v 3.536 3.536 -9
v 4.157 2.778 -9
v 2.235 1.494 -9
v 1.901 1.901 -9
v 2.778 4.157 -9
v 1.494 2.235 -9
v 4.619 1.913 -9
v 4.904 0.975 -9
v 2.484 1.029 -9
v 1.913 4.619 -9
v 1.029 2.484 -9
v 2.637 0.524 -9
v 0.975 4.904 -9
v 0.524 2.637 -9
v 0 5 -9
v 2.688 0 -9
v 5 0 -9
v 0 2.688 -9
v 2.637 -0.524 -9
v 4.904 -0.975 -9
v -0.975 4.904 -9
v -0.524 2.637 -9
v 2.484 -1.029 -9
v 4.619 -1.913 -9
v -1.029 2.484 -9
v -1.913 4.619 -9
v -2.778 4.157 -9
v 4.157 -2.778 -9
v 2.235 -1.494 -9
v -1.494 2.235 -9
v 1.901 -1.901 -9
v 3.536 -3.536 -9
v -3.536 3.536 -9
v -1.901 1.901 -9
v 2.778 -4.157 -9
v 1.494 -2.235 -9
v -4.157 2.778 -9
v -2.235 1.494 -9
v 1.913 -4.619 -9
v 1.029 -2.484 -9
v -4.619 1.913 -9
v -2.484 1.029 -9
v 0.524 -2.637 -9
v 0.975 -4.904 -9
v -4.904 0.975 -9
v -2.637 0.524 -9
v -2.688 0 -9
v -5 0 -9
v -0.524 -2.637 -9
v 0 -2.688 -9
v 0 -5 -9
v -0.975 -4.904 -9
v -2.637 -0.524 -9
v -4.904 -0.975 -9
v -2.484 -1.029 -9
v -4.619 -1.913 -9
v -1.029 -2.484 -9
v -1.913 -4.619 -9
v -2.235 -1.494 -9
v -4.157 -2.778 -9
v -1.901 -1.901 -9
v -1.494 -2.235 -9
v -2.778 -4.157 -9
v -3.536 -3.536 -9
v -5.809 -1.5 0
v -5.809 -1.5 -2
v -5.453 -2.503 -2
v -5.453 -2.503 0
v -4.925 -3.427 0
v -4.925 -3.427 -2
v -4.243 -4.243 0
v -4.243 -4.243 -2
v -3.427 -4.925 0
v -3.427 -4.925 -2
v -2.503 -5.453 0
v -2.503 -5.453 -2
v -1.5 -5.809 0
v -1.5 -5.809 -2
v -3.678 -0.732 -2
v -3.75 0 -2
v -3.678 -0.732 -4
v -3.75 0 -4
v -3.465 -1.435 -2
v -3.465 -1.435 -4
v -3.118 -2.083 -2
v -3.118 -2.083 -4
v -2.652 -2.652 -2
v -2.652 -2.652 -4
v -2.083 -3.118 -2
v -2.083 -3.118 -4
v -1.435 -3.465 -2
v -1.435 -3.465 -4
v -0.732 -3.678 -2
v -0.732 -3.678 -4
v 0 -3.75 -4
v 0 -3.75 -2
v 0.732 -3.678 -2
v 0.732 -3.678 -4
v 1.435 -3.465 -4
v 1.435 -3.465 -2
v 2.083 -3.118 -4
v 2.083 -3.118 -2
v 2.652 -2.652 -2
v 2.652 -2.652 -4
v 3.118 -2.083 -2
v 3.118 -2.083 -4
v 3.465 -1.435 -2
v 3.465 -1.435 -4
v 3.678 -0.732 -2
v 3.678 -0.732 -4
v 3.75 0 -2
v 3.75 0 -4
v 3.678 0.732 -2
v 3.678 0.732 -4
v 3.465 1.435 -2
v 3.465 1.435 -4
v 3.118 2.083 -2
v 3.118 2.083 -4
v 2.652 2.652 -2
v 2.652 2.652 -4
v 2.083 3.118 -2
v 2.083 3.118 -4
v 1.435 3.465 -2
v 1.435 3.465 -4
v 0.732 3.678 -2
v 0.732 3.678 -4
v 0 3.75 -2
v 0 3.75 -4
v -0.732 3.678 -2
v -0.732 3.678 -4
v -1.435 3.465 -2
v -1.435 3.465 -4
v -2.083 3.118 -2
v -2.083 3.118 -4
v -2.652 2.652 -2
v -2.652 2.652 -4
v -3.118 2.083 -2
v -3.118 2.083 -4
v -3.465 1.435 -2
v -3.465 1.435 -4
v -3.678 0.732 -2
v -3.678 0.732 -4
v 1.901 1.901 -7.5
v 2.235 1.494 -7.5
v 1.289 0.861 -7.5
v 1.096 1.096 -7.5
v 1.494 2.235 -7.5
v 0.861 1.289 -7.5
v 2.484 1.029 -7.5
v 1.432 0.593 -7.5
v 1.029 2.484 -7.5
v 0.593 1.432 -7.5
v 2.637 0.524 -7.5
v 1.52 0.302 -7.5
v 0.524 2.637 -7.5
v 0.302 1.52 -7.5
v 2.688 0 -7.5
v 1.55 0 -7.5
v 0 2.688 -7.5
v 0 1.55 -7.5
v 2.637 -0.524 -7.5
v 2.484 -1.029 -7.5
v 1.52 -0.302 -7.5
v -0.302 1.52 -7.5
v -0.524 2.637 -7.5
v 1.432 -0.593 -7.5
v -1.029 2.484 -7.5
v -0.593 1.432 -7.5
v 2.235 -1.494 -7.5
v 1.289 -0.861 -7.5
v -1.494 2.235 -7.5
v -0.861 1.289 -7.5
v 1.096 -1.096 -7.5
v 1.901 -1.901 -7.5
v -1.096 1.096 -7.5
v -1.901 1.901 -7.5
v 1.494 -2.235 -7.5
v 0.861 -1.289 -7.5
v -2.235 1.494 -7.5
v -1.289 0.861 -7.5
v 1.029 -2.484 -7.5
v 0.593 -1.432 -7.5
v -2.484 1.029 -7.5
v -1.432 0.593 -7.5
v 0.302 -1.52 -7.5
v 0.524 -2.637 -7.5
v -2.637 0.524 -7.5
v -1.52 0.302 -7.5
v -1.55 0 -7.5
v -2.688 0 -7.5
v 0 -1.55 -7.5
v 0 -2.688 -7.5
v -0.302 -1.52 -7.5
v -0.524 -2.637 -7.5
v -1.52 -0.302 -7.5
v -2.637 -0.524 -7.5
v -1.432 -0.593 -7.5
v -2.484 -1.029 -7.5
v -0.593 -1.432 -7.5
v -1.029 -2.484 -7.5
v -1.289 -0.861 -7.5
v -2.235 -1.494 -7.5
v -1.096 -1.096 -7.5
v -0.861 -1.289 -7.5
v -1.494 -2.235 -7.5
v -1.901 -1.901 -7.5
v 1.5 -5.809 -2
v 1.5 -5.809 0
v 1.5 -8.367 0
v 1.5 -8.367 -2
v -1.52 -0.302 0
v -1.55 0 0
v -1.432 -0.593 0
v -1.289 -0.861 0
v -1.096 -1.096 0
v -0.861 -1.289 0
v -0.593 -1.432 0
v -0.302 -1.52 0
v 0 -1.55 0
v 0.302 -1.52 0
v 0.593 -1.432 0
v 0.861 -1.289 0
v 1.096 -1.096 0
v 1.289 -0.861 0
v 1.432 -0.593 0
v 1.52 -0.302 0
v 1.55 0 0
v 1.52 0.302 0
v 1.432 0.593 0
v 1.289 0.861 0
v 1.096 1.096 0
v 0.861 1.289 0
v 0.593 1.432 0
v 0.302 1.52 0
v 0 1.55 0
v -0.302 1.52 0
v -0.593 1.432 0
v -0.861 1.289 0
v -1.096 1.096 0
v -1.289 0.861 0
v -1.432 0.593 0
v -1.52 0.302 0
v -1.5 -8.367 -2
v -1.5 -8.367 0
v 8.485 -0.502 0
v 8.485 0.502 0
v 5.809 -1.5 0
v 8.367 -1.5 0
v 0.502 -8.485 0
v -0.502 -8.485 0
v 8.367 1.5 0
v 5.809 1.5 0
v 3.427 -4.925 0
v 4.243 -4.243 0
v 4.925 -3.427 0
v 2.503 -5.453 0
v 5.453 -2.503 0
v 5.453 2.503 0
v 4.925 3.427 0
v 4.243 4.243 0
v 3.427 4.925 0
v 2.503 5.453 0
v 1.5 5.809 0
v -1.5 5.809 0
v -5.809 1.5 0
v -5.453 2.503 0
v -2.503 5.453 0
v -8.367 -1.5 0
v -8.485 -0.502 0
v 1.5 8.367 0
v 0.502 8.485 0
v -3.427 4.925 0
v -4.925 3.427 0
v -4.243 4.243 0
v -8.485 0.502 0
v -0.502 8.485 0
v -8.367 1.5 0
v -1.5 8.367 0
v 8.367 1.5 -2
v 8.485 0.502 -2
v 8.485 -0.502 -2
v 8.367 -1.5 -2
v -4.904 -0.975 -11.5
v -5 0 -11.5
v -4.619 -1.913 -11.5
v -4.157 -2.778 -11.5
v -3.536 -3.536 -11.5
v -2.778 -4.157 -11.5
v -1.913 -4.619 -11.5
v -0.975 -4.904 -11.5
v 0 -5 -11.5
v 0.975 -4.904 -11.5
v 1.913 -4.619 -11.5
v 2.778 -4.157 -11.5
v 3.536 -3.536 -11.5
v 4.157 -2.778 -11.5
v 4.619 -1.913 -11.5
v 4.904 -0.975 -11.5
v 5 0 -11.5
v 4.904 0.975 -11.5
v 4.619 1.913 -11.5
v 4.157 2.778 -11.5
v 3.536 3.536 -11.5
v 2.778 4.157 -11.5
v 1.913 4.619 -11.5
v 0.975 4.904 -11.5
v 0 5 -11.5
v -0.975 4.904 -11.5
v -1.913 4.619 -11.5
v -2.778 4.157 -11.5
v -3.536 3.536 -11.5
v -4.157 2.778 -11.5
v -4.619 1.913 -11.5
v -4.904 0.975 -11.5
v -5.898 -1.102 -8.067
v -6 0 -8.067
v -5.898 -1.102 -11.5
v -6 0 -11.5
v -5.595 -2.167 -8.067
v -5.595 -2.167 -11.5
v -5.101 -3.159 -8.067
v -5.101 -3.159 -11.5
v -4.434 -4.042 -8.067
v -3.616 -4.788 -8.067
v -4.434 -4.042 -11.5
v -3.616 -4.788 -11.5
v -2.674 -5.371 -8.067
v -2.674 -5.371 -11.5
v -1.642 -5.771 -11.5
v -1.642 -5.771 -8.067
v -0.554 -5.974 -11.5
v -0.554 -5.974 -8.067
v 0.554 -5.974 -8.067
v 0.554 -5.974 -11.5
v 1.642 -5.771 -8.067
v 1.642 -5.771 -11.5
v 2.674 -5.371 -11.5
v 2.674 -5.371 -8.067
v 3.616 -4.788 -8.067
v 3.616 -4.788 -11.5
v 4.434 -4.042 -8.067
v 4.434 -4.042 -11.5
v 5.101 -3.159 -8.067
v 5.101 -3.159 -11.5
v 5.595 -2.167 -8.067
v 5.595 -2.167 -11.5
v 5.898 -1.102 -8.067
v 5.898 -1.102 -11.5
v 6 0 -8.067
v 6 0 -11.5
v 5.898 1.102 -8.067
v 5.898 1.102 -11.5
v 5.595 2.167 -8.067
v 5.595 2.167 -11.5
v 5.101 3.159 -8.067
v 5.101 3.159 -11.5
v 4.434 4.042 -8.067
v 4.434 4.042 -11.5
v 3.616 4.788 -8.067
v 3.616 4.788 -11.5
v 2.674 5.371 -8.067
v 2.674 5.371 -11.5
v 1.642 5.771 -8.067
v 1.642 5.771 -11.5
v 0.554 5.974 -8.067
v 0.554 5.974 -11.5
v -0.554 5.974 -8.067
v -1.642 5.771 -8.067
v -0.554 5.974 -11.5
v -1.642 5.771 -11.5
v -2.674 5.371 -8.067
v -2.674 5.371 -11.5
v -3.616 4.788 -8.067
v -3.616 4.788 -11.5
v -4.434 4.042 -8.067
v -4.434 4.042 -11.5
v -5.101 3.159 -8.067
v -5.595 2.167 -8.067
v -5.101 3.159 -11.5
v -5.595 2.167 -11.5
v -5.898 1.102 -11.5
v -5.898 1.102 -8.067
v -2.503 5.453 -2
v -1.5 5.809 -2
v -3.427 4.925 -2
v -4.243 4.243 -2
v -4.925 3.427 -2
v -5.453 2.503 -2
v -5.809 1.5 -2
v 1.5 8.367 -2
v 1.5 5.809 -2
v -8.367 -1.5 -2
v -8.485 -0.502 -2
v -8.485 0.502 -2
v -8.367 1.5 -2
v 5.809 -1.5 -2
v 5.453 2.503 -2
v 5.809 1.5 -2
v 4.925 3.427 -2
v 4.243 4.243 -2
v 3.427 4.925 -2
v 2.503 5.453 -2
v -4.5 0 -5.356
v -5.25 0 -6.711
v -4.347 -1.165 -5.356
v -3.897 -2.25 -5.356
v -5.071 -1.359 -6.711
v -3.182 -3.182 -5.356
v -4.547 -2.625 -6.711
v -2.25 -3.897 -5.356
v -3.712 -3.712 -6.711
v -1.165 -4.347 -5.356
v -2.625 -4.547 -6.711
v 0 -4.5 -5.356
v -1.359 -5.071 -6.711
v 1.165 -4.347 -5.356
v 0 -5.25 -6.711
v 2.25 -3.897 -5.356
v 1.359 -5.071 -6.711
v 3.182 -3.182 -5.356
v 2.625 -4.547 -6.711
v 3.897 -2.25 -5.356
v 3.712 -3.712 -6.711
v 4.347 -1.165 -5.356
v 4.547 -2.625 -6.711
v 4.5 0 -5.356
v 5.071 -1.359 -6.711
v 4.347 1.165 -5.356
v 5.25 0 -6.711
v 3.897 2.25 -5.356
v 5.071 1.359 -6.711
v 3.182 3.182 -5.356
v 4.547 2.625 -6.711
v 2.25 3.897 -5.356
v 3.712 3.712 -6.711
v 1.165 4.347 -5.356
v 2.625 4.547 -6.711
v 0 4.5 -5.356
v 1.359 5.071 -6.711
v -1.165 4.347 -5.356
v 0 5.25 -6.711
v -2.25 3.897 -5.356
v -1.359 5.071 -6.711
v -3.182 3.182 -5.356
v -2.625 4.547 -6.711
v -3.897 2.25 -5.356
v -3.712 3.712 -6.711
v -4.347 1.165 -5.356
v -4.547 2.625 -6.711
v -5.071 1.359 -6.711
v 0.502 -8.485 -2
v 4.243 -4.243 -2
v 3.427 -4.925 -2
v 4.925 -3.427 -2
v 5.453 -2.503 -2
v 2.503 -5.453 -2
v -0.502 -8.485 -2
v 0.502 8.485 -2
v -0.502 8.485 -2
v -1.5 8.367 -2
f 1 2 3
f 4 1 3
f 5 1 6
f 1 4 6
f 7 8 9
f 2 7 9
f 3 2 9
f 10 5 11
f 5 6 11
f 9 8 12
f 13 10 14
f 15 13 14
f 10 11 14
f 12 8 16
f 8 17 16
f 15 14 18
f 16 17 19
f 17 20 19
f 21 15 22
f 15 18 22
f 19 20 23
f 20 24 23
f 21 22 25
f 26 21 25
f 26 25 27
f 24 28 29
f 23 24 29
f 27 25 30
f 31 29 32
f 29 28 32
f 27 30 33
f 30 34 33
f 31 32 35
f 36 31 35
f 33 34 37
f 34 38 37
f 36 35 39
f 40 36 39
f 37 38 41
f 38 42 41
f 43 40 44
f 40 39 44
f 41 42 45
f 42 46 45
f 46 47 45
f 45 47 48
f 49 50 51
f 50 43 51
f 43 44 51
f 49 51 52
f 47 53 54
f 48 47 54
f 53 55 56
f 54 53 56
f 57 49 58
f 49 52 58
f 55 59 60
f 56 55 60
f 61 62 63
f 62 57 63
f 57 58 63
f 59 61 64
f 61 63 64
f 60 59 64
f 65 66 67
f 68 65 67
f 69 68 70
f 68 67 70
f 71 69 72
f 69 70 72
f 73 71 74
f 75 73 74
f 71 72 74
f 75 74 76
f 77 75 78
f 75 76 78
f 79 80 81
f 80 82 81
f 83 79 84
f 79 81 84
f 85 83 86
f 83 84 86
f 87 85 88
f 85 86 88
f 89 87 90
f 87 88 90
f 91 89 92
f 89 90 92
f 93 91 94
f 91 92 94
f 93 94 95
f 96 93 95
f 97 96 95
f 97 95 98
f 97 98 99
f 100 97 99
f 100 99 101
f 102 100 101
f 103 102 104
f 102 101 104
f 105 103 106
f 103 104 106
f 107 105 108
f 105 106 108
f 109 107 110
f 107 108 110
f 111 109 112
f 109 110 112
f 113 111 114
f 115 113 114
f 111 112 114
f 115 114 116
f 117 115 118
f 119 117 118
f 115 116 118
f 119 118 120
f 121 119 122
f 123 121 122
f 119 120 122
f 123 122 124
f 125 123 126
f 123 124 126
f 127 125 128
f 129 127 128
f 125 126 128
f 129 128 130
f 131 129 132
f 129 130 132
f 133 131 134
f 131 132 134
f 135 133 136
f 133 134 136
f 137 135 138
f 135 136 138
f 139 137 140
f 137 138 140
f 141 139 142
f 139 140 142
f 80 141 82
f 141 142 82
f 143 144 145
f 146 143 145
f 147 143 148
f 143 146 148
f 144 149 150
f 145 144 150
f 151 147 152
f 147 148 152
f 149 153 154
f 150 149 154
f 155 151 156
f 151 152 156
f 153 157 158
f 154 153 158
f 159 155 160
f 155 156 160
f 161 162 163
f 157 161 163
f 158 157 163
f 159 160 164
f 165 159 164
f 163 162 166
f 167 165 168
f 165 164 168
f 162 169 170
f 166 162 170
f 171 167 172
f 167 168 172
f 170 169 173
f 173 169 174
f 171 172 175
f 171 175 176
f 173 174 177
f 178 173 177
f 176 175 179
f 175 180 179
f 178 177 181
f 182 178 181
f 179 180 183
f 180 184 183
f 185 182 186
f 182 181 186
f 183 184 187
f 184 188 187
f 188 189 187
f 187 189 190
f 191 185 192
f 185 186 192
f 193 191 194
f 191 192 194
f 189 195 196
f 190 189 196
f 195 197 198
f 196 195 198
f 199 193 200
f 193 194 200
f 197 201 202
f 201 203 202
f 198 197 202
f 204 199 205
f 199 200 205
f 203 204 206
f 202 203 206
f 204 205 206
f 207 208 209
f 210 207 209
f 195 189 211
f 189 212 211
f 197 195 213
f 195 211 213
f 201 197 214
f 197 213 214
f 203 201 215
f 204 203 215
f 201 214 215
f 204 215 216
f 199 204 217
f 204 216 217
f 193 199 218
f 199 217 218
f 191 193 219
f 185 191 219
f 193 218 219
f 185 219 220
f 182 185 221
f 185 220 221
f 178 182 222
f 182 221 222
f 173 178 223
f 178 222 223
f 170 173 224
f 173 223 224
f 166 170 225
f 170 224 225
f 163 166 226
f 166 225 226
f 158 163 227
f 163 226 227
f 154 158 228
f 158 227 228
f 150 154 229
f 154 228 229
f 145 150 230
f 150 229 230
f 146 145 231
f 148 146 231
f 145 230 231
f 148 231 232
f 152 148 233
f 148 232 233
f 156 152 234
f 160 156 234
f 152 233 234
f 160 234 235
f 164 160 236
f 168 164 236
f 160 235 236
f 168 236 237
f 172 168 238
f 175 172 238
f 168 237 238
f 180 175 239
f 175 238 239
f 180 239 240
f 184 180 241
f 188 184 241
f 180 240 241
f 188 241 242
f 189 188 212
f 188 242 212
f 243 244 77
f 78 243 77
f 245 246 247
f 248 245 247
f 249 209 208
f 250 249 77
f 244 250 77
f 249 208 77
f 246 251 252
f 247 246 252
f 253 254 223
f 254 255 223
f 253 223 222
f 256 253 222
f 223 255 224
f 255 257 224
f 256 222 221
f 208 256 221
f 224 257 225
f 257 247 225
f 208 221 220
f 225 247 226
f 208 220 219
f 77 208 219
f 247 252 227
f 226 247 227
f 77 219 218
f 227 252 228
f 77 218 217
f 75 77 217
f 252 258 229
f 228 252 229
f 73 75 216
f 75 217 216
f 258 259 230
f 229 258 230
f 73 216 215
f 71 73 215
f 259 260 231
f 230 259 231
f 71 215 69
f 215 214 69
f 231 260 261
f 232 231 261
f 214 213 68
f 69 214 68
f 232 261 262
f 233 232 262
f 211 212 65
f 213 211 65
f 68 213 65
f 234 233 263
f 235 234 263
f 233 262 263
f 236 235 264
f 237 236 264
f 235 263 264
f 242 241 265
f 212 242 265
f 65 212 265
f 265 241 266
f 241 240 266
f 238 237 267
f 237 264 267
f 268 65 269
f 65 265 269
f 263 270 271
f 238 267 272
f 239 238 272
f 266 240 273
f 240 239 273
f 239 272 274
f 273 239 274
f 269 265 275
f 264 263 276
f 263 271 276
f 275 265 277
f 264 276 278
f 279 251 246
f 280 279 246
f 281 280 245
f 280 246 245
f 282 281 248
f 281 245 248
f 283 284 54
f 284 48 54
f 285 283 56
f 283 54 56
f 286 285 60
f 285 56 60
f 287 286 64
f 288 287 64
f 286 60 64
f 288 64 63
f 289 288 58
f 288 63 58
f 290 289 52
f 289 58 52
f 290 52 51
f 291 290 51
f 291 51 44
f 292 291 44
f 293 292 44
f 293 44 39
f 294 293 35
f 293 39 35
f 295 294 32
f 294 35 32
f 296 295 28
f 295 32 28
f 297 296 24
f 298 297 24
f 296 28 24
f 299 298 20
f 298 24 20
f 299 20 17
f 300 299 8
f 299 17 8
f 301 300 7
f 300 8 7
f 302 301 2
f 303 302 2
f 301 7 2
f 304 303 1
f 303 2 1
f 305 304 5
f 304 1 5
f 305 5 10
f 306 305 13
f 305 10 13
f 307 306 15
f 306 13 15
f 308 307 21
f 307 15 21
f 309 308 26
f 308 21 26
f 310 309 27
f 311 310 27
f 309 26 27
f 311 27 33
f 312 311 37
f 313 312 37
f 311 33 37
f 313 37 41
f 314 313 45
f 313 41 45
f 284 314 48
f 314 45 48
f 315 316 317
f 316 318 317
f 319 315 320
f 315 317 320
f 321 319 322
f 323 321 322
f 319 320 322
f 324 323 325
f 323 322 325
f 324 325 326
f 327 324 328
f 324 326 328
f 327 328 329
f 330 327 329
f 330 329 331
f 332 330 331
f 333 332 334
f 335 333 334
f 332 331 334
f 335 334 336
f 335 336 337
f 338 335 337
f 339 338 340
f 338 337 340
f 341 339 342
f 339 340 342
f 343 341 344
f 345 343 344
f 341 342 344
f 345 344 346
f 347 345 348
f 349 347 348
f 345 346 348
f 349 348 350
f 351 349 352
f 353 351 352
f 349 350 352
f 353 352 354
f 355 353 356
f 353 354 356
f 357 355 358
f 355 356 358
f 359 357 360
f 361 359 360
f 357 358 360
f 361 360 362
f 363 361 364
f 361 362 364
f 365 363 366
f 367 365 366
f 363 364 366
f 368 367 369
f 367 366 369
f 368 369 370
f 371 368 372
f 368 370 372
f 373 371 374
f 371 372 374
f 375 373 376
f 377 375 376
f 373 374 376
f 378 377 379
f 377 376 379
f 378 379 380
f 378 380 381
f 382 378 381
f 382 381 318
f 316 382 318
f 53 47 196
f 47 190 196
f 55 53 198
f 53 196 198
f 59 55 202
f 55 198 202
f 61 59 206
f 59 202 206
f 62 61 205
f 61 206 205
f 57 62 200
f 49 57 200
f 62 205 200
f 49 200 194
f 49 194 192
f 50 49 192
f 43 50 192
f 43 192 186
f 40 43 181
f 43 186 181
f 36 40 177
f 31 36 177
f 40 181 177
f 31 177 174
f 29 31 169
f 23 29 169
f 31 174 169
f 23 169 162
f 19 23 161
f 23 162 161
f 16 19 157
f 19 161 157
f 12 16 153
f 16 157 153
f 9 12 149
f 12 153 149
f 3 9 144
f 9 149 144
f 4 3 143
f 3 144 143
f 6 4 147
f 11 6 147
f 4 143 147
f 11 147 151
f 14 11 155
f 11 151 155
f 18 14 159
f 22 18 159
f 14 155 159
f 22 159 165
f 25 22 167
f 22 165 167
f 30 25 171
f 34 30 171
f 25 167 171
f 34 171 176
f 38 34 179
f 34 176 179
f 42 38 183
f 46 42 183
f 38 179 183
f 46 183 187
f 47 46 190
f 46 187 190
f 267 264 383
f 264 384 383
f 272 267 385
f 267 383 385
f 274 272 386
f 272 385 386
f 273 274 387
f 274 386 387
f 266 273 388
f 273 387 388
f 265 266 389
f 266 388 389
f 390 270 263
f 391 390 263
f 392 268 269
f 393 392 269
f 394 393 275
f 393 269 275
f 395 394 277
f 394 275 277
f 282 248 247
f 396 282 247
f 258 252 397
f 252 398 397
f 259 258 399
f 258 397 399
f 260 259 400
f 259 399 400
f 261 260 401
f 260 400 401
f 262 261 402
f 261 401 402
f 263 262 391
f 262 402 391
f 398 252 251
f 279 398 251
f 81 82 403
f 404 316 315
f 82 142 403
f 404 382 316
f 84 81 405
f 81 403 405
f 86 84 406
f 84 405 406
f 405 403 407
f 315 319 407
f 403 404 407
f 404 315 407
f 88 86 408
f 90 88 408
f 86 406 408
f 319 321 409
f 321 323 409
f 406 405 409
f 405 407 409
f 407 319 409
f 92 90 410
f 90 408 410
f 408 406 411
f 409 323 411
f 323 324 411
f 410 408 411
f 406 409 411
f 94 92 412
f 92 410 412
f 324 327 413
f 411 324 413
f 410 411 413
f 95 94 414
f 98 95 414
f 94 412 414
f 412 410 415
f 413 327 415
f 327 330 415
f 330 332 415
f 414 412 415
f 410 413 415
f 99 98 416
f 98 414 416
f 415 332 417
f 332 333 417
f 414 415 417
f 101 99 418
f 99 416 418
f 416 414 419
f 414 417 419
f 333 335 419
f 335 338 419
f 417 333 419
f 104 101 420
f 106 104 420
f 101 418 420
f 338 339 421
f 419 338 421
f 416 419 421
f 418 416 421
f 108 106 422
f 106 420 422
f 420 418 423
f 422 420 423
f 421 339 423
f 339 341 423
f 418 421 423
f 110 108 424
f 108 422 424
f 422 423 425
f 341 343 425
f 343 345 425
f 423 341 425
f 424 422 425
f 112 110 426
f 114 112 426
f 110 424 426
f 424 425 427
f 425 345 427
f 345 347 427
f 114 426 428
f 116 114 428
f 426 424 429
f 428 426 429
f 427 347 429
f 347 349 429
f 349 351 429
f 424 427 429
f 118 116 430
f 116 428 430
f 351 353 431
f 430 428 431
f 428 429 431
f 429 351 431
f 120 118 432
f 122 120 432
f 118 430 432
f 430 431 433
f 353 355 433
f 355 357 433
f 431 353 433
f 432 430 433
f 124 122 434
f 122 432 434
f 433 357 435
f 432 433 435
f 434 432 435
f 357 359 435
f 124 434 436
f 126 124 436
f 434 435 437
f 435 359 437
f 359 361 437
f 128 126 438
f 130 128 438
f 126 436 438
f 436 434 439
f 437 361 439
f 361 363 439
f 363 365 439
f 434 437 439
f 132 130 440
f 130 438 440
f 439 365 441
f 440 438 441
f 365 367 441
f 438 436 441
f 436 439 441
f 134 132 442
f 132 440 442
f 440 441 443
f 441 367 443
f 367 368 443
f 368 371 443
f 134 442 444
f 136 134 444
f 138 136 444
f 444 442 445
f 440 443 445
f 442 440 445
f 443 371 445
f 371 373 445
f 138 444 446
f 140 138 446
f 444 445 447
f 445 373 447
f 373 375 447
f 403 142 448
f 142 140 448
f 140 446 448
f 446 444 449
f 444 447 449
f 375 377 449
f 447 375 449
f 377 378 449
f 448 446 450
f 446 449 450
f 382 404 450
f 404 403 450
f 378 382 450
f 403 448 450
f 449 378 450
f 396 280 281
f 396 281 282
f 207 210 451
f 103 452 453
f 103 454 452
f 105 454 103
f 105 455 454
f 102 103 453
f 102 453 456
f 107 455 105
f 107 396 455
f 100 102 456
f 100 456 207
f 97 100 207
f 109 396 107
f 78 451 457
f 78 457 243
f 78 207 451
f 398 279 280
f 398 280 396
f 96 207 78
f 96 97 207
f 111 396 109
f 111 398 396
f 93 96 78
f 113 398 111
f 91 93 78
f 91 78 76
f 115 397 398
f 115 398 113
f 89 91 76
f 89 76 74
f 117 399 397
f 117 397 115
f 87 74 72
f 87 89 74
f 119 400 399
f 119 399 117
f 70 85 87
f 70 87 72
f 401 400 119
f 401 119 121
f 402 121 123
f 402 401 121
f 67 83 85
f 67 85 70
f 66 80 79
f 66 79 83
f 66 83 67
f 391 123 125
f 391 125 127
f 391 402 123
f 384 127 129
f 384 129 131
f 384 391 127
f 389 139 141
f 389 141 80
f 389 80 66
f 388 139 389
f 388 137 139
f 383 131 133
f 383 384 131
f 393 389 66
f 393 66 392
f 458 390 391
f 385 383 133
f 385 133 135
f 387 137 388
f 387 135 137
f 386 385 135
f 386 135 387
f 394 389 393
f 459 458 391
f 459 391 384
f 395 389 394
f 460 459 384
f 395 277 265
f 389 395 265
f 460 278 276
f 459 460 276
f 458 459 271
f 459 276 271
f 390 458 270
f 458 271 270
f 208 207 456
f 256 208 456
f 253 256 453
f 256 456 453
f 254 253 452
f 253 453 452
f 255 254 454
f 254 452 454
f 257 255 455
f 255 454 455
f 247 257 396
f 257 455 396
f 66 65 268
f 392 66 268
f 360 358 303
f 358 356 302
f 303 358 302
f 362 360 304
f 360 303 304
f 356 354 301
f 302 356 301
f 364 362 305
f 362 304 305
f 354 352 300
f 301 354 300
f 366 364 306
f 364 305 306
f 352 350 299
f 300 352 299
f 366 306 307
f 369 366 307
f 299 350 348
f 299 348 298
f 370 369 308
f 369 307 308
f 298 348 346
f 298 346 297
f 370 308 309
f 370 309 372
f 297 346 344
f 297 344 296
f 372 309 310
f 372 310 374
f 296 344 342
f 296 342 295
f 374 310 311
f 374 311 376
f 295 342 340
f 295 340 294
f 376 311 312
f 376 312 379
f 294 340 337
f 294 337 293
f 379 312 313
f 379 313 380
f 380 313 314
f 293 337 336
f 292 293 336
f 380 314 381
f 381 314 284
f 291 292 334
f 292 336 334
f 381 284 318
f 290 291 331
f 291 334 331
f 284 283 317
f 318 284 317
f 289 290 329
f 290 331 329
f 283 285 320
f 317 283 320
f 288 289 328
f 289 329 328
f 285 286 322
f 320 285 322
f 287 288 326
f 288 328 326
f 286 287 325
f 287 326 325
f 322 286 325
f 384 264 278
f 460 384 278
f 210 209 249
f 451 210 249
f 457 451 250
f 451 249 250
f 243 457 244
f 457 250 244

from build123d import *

# Parameters (mm, degrees)
BOSS_EXTRUDE1_DEPTH = 2


with BuildPart() as part:
    # Sketch1 → Revolve1 (revolve)
    with BuildSketch(Plane(origin=(0, 0, 0), x_dir=(1, 0, 0), z_dir=(0, 1, 0))):
        Polygon((-1.55, 0), (-6, 0), (-6, 2), (-3.75, 2), (-3.75, 4), (-6, 8.067249704), (-6, 11.5), (-5, 11.5), (-5, 9), (-2.688359629, 9), (-2.688359629, 7.5), (-1.55, 7.5), align=None)
    revolve(axis=Axis((0, 0, -14.260315956), (0, 0, 1)))

    # Sketch2 → Boss-Extrude1 (add)
    with BuildSketch(Plane.XY):
        with BuildLine():
            Line((-8.366600265, 1.5), (-5.809475019, 1.5))
            ThreePointArc((-5.809475019, 1.5), (-6, 0), (-5.809475019, -1.5))
            Line((-5.809475019, -1.5), (-8.366600265, -1.5))
            ThreePointArc((-8.366600265, -1.5), (-8.5, 0), (-8.366600265, 1.5))
        make_face()
        with BuildLine():
            Line((1.5, 8.366600265), (1.5, 5.809475019))
            ThreePointArc((1.5, 5.809475019), (0, 6), (-1.5, 5.809475019))
            Line((-1.5, 5.809475019), (-1.5, 8.366600265))
            ThreePointArc((-1.5, 8.366600265), (0, 8.5), (1.5, 8.366600265))
        make_face()
        with BuildLine():
            Line((8.366600265, -1.5), (5.809475019, -1.5))
            ThreePointArc((5.809475019, -1.5), (6, 0), (5.809475019, 1.5))
            Line((5.809475019, 1.5), (8.366600265, 1.5))
            ThreePointArc((8.366600265, 1.5), (8.5, 0), (8.366600265, -1.5))
        make_face()
        with BuildLine():
            Line((-1.5, -8.366600265), (-1.5, -5.809475019))
            ThreePointArc((-1.5, -5.809475019), (0, -6), (1.5, -5.809475019))
            Line((1.5, -5.809475019), (1.5, -8.366600265))
            ThreePointArc((1.5, -8.366600265), (0, -8.5), (-1.5, -8.366600265))
        make_face()
    extrude(amount=-BOSS_EXTRUDE1_DEPTH)


solid = part.part
